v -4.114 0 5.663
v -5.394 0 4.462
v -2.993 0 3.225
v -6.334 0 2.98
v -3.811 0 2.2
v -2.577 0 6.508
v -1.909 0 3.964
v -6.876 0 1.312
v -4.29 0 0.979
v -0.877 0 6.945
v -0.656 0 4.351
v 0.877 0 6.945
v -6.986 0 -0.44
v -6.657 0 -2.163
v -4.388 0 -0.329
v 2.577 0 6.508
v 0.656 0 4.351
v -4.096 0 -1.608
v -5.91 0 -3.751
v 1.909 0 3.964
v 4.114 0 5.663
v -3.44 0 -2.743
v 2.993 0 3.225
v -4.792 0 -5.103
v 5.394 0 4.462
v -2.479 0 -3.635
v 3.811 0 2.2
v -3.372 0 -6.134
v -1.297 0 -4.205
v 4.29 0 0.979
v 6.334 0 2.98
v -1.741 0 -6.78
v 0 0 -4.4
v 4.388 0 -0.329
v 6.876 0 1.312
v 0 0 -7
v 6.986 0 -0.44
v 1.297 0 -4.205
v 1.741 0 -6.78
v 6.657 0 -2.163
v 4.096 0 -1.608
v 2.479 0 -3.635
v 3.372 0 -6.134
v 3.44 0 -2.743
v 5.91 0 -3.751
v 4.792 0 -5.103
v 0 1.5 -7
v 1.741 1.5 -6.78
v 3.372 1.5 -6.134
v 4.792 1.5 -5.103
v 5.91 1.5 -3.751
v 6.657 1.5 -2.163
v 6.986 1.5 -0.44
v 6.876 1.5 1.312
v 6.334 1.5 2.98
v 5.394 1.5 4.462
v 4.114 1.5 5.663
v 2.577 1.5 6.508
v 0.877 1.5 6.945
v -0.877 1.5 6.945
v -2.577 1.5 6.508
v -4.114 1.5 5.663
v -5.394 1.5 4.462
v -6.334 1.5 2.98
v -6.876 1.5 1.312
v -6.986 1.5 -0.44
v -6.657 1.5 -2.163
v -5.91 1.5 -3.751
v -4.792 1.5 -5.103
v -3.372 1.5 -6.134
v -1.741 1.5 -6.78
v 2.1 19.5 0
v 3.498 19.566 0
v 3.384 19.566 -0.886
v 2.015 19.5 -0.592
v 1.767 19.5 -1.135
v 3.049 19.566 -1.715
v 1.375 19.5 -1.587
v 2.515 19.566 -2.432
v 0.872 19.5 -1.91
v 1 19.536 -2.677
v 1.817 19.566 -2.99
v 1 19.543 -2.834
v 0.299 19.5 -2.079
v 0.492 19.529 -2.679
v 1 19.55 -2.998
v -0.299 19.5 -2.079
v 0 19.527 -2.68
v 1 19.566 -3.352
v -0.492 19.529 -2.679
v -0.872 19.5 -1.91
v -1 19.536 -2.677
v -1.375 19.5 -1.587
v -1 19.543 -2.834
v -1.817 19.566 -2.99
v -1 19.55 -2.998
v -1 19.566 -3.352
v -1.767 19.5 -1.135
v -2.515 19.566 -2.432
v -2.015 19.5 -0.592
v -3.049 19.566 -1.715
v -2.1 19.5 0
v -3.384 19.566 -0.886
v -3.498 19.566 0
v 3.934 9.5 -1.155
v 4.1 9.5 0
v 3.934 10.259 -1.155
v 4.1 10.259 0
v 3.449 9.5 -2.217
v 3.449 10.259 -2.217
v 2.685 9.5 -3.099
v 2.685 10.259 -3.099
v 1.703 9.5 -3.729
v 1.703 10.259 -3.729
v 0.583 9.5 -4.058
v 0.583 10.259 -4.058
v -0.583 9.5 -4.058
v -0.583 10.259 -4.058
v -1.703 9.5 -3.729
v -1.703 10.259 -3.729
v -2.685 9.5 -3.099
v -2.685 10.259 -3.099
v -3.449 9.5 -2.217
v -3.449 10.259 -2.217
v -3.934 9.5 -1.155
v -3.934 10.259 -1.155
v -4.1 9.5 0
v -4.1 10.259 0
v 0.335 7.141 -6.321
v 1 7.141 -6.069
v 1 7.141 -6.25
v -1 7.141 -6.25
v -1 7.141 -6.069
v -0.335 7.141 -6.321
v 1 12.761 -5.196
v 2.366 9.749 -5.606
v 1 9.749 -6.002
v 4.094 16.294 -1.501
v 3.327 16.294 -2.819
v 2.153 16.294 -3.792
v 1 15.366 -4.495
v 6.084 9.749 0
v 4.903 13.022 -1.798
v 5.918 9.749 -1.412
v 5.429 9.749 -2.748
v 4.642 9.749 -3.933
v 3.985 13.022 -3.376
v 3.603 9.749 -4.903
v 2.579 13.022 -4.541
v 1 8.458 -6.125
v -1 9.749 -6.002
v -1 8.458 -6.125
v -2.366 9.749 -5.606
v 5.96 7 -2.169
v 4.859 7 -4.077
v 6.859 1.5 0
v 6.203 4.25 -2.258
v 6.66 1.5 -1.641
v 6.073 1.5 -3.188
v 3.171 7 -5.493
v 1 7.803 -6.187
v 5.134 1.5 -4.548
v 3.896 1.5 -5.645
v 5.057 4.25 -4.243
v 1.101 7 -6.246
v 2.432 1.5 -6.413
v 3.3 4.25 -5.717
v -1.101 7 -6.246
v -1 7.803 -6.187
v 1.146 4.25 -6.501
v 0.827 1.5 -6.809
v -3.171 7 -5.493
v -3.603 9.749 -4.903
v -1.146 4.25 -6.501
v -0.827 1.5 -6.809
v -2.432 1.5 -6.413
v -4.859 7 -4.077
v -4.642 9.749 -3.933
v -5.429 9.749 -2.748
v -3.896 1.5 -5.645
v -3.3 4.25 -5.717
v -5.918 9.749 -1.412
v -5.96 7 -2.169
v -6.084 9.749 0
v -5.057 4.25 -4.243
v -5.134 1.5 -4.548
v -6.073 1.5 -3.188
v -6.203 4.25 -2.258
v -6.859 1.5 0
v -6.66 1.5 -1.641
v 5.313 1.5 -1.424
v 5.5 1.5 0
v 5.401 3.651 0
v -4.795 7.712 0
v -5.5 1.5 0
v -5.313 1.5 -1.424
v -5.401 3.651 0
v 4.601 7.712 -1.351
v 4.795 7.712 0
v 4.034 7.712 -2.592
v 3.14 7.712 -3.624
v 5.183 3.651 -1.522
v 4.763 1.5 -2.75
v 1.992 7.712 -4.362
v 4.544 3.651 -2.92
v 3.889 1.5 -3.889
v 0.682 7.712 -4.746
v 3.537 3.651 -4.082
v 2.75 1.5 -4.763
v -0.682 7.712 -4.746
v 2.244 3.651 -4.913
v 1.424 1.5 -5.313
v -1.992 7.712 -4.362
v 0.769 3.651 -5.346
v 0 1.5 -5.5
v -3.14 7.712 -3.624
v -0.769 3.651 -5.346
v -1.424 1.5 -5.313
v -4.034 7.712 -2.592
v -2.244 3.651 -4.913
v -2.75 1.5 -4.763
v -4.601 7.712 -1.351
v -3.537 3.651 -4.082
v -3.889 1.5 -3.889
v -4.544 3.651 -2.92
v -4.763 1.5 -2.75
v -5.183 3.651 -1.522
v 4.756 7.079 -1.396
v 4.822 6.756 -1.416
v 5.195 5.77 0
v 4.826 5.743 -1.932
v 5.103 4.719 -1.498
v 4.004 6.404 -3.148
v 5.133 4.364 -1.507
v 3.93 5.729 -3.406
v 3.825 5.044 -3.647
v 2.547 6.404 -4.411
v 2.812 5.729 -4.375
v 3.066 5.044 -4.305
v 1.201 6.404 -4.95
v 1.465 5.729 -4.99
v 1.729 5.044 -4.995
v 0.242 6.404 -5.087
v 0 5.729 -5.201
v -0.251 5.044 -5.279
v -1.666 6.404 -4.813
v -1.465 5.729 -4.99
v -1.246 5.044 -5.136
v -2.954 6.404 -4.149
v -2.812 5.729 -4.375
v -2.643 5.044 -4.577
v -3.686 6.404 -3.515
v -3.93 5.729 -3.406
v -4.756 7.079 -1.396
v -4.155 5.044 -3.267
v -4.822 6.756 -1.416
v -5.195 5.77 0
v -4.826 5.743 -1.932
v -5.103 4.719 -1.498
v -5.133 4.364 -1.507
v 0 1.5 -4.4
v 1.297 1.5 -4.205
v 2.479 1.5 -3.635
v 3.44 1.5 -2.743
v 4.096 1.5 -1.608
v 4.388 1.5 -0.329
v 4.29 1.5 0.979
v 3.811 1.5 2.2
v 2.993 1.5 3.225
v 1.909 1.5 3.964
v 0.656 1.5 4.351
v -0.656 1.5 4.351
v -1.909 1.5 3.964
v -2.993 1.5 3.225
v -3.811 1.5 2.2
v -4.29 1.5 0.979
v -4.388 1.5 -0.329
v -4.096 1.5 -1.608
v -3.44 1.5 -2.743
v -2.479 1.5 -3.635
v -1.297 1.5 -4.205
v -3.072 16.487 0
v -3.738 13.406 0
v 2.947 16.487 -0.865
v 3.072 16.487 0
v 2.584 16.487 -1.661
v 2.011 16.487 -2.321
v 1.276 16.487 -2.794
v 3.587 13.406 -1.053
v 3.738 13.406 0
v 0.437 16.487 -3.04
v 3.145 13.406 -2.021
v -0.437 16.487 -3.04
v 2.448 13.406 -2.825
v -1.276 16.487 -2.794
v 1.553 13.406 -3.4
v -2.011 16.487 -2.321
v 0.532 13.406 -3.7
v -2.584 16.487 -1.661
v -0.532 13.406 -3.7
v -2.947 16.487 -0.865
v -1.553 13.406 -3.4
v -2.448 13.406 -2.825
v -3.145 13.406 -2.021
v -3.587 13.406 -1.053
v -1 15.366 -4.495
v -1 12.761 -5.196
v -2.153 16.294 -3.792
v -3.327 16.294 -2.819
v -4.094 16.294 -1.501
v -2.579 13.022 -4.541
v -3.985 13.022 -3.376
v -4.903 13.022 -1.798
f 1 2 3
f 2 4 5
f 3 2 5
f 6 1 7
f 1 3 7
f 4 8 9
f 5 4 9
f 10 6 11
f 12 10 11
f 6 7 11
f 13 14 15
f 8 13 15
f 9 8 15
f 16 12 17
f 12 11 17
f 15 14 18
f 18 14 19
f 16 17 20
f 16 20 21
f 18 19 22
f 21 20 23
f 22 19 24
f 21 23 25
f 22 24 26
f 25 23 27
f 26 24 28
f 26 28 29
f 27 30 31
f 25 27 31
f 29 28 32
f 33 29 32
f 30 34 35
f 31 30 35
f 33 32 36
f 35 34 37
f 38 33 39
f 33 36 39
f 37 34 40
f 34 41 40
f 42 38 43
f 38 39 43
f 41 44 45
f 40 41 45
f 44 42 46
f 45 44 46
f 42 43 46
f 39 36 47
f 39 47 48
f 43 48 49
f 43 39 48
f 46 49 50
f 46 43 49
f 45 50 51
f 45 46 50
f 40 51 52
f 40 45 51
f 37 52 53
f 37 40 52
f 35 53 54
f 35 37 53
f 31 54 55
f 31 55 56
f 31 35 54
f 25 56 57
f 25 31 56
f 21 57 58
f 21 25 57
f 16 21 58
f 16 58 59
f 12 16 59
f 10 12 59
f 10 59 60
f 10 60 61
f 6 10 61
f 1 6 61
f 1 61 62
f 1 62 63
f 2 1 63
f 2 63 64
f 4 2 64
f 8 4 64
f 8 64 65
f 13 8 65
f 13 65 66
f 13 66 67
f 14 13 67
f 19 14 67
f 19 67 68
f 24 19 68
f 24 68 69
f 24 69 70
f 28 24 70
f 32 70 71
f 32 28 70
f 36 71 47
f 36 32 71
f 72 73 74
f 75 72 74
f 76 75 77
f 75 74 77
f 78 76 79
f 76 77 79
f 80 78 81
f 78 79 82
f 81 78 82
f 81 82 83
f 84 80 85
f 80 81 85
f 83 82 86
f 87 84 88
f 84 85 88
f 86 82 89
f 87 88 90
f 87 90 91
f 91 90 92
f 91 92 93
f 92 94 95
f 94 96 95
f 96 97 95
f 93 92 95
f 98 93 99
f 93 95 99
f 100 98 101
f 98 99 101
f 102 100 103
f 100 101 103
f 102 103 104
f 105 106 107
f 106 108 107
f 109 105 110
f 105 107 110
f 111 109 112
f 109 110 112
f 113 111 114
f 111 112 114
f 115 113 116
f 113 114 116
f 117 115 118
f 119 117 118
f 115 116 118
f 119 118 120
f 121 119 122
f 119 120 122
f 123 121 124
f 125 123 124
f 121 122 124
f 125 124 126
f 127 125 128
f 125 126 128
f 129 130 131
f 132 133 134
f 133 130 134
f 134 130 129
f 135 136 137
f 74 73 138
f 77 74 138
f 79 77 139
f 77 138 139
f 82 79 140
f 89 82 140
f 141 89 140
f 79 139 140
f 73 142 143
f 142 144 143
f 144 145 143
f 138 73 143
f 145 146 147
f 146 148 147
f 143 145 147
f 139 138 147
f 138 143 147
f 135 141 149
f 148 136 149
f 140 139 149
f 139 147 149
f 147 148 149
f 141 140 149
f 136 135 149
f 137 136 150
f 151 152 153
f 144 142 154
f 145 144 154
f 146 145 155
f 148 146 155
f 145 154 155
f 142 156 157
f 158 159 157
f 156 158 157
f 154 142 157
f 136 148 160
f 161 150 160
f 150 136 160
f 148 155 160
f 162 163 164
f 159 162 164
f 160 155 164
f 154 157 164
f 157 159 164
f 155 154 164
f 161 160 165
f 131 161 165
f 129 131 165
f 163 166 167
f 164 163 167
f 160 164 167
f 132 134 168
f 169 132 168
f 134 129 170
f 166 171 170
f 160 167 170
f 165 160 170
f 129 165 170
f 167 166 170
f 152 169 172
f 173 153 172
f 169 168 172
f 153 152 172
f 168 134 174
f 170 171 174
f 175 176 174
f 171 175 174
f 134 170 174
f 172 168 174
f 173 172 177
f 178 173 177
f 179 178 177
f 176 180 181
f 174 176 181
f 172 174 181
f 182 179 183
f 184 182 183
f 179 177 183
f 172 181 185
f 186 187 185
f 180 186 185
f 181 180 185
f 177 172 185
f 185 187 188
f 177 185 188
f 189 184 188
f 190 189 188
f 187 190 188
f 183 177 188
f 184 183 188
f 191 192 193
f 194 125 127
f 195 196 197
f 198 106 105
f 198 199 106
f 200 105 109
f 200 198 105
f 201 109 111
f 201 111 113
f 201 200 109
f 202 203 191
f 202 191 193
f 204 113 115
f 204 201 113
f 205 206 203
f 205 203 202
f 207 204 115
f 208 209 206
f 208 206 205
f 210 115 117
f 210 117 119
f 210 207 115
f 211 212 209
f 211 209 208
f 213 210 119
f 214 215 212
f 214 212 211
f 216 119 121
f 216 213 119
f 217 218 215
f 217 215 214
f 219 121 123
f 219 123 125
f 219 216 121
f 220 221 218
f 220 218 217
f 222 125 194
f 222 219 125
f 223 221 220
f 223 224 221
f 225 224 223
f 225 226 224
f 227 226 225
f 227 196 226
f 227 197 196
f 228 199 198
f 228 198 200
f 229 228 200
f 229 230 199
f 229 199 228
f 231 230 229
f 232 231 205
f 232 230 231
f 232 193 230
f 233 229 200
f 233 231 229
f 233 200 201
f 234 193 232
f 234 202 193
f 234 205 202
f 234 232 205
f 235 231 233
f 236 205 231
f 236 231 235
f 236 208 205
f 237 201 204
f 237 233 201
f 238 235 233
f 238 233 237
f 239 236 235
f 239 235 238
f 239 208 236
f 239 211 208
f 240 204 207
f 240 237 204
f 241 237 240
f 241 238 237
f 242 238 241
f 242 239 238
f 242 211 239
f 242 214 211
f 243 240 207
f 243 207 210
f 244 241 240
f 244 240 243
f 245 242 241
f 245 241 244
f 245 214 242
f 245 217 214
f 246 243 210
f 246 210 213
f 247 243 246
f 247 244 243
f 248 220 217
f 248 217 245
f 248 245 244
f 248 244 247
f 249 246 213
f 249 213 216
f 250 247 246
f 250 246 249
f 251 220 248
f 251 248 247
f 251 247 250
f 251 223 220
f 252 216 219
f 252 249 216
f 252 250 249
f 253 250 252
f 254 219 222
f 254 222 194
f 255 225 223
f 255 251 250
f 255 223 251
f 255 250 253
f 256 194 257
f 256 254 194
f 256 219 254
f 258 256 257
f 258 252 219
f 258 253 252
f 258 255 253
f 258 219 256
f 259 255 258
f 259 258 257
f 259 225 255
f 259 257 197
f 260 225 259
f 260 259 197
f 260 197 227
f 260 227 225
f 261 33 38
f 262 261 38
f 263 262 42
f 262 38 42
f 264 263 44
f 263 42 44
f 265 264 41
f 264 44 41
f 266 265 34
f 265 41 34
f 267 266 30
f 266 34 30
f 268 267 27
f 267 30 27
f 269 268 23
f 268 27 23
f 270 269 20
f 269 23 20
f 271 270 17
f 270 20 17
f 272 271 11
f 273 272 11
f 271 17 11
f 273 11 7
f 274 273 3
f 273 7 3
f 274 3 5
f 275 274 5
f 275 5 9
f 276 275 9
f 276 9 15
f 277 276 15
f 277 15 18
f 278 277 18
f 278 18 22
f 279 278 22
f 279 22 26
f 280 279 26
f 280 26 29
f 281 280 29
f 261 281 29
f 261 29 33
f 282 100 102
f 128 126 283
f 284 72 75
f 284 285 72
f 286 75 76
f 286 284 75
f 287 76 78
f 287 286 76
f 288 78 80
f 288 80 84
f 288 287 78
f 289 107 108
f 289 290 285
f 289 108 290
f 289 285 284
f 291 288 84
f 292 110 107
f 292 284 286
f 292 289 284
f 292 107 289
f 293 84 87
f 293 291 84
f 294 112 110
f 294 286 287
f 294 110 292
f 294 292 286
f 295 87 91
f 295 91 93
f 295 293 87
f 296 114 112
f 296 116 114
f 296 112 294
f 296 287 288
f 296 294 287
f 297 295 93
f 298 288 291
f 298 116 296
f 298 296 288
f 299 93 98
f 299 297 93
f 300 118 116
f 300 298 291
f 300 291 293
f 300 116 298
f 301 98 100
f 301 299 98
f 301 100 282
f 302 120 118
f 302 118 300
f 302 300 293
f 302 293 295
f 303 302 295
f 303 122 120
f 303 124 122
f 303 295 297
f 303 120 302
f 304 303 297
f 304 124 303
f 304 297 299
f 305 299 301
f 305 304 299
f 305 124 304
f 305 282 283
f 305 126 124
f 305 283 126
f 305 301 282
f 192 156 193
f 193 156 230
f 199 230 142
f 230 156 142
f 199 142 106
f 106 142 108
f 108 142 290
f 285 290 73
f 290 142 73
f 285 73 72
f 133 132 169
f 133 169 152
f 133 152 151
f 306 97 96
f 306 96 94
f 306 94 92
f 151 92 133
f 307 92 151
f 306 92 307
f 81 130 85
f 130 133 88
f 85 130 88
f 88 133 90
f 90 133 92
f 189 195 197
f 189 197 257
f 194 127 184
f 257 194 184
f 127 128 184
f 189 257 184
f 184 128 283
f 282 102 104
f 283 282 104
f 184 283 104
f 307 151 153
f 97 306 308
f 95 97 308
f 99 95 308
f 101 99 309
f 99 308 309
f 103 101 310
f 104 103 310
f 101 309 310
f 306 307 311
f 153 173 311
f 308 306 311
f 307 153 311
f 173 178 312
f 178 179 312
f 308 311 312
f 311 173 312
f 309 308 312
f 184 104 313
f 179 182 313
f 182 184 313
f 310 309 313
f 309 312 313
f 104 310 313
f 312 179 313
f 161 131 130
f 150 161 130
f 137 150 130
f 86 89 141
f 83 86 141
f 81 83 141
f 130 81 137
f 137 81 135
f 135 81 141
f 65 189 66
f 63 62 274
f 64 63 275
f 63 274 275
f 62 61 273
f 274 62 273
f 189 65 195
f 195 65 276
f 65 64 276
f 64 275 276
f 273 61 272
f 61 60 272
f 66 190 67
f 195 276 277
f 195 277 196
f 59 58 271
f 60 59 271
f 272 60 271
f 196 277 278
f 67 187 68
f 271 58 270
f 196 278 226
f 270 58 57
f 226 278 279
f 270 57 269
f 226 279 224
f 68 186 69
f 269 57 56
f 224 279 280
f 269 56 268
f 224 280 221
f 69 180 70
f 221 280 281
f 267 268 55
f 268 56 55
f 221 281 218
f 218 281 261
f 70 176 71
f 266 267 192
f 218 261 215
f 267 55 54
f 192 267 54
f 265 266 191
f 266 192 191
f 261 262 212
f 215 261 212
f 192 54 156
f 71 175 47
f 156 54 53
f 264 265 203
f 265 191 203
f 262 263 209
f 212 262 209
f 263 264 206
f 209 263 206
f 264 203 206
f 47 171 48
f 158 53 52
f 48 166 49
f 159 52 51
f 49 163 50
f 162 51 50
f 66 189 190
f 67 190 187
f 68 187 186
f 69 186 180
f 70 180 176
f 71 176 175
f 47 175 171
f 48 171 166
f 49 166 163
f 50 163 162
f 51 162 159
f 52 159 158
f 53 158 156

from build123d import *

# Parameters (mm, degrees)
REVOLUCI_N1_ANGLE          = 180
CROQUIS2_R                 = 7
SALIENTE_EXTRUIR1_DEPTH    = 1.5
CROQUIS3_R                 = 4.4
CORTAR_EXTRUIR1_DEPTH      = 3
CORTAR_EXTRUIR6_DEPTH      = 1
CORTAR_EXTRUIR6_DEPTH_BACK = 1


with BuildPart() as part:
    # Croquis1 → Revolución1 (revolve)
    with BuildSketch(Plane.XY):
        with BuildLine():
            Line((0, 0), (0, 1.5))
            Line((0, 1.5), (5.5, 1.5))
            add(Edge.make_bspline(
                [(4.1, 9.5), (5.288924253, 7.200139579), (5.394574911, 4.30480441), (5.5, 1.5)],
                knots=[0, 0, 0, 0, 0.667768354, 0.667768354, 0.667768354, 0.667768354], degree=3))
            Line((4.1, 9.5), (4.1, 10.258992023))
            add(Edge.make_bspline(
                [(2.1, 19.5), (3.785937607, 15.030292429), (4.1, 10.258992023)],
                knots=[0, 0, 0, 1, 1, 1], degree=2))
            Line((2.1, 19.5), (3.498445406, 19.565957924))
            Line((3.498445406, 19.565957924), (6.084400468, 9.749308612))
            Line((6.084400468, 9.749308612), (7, 0))
            Line((7, 0), (0, 0))
        make_face()
    revolve(axis=Axis((0, 1.5, 0), (0, 1, 0)), revolution_arc=REVOLUCI_N1_ANGLE)

    # Croquis2 → Saliente-Extruir1 (add)
    with BuildSketch(Plane.XZ):
        Circle(CROQUIS2_R)
    extrude(amount=-SALIENTE_EXTRUIR1_DEPTH)

    # Croquis3 → Cortar-Extruir1 (cut)
    with BuildSketch(Plane.XZ):
        Circle(CROQUIS3_R)
    extrude(amount=-CORTAR_EXTRUIR1_DEPTH, mode=Mode.SUBTRACT)

    # Croquis4 → Cortar-Extruir6 (cut, two sides: drawn at the far end of the back side and taken through both)
    with BuildSketch(Plane(origin=(0, 0, 0), x_dir=(0, 0, -1), z_dir=(1, 0, 0)).offset(-CORTAR_EXTRUIR6_DEPTH_BACK)):
        Polygon((6.768665295, 7.140982448), (6.068665295, 7.140982448), (2.336951323, 20.779679502), (3.498445406, 19.565957924), (4.898652058, 19.565957924), (8.788984747, 7.140982448), align=None)
    extrude(amount=CORTAR_EXTRUIR6_DEPTH + CORTAR_EXTRUIR6_DEPTH_BACK, mode=Mode.SUBTRACT)


solid = part.part
